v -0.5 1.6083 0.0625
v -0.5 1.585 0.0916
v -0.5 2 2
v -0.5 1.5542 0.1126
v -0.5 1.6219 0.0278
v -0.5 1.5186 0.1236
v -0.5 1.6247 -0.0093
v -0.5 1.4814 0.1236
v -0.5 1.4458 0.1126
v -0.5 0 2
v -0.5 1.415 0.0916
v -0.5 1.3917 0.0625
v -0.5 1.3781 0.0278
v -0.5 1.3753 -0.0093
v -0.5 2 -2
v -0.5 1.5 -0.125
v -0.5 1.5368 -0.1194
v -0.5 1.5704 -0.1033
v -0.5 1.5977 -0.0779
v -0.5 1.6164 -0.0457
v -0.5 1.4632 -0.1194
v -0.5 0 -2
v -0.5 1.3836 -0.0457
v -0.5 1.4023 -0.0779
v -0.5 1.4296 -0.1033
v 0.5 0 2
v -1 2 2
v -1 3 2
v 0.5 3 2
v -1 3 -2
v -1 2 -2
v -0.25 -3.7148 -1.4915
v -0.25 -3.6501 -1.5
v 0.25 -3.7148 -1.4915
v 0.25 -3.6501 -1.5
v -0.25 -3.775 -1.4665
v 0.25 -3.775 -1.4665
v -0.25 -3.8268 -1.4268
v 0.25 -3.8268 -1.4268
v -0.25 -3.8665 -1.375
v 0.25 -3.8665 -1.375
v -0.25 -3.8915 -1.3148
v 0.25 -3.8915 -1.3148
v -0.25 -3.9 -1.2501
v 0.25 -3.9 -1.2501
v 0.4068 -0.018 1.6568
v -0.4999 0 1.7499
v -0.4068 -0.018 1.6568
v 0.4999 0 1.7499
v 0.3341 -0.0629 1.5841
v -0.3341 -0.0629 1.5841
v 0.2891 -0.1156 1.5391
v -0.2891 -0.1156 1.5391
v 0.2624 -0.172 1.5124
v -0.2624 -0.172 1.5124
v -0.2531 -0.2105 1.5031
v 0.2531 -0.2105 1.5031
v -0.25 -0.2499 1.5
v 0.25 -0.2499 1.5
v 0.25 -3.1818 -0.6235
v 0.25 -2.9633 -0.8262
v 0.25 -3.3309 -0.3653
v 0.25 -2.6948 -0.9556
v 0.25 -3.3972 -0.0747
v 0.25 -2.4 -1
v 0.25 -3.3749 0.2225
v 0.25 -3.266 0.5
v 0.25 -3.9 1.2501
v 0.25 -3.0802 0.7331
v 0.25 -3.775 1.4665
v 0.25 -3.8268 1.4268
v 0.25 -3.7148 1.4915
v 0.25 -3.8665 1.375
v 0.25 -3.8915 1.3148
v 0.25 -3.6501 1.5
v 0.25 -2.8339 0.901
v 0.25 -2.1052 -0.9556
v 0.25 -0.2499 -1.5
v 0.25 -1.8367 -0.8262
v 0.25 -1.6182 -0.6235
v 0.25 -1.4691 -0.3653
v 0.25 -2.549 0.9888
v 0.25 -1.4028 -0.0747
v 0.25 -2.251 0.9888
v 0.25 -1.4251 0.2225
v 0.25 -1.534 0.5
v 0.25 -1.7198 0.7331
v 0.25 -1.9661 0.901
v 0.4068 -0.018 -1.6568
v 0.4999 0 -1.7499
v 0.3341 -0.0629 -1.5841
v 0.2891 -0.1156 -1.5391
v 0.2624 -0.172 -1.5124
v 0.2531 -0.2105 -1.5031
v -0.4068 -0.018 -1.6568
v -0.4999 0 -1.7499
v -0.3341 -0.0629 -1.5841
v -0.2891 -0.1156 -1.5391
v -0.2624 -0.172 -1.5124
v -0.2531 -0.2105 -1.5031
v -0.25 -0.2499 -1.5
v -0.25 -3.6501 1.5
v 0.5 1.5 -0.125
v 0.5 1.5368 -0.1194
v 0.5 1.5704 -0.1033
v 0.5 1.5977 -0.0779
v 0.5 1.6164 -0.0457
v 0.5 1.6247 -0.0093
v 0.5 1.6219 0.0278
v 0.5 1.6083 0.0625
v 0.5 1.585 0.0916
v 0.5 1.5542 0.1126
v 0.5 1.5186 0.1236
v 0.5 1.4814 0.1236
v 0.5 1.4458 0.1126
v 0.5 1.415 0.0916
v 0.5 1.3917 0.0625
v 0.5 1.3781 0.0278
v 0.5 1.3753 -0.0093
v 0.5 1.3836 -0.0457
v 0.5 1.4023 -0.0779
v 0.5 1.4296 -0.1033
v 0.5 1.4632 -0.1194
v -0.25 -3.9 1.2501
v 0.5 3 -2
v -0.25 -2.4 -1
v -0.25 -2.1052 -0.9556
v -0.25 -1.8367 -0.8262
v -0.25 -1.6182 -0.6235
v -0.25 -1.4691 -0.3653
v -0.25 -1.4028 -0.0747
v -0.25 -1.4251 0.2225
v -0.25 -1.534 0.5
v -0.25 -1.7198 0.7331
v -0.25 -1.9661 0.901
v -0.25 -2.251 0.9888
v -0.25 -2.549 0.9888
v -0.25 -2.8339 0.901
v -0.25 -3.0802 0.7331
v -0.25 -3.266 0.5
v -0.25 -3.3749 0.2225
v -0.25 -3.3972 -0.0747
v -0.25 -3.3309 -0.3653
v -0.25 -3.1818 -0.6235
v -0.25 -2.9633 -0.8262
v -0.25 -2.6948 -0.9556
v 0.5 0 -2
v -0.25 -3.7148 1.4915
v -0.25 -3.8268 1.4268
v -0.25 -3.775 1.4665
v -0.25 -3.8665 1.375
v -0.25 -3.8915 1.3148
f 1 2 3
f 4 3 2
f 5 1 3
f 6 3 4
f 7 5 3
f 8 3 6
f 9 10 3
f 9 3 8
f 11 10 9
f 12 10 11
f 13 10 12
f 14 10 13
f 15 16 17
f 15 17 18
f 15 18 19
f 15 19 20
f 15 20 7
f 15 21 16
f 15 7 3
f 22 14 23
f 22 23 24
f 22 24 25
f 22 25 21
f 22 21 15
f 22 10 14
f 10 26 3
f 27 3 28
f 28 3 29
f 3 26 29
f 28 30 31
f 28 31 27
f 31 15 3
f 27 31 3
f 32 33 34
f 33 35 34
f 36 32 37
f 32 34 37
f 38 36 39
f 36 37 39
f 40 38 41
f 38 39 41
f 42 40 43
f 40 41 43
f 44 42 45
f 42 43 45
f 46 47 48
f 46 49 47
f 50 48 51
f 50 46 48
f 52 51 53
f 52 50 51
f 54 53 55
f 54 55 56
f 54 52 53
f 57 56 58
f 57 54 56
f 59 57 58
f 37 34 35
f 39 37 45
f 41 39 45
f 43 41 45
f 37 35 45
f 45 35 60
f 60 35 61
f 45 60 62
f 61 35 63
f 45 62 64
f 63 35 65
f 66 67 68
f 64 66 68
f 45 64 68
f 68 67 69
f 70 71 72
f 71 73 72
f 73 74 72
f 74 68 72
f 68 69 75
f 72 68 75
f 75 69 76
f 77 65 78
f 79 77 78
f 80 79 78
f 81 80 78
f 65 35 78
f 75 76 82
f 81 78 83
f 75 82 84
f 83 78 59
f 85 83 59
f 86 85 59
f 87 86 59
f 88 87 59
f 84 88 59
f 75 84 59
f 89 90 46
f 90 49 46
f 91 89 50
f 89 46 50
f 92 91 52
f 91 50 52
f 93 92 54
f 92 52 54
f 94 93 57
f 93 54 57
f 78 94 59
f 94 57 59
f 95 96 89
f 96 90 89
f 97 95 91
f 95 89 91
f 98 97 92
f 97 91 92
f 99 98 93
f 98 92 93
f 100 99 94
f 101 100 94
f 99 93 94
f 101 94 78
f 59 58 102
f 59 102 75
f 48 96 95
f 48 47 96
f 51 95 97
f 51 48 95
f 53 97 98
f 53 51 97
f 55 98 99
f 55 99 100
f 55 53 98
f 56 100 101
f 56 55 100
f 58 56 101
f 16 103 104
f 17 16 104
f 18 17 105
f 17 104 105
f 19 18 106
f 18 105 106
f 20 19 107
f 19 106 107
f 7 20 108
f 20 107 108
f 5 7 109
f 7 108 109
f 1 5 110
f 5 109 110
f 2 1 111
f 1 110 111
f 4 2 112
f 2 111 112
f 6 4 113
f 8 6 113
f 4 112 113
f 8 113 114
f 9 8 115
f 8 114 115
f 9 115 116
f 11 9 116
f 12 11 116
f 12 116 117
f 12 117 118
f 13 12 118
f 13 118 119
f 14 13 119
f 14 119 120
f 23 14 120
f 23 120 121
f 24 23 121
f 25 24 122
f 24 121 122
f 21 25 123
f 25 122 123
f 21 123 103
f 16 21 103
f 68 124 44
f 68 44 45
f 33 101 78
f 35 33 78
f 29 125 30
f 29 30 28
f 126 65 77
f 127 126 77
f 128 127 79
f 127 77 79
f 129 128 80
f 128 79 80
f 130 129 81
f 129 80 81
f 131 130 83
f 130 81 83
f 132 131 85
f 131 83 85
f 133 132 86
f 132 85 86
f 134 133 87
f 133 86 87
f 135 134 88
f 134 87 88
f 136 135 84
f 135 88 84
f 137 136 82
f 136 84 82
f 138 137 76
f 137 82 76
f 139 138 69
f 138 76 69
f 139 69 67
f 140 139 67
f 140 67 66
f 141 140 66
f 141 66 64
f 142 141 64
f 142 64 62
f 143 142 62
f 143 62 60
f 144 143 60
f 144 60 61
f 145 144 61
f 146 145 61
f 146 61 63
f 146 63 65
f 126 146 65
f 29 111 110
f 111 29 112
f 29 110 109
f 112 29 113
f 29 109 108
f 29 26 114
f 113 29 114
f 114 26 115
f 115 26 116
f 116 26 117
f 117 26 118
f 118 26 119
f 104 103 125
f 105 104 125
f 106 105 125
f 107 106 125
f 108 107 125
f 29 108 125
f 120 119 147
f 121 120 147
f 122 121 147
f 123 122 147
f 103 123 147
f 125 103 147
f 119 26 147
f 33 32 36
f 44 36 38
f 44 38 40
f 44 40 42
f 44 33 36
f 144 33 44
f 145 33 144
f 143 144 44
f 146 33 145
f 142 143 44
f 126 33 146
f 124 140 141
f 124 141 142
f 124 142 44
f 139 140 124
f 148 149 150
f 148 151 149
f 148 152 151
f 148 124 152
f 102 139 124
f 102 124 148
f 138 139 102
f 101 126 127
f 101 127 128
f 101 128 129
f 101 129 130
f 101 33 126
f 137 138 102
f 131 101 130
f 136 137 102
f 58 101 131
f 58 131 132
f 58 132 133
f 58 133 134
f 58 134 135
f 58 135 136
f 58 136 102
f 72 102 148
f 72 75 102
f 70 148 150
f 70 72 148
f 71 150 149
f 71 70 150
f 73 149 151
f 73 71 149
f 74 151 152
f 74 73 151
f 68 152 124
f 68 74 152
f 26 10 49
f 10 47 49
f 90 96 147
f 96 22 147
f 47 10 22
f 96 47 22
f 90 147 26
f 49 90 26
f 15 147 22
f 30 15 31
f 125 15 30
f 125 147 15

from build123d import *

# Parameters (mm, degrees)
SZKIC1_W                    = 1
SZKIC1_H                    = 4
DODANIE_WYCI_GNI_CIE1_DEPTH = 3
SZKIC4_W                    = 0.5
SZKIC4_H                    = 3
DODANIE_WYCI_GNI_CIE3_DEPTH = 3.9
SZKIC5_R                    = 1
WYTNIJ_WYCI_GNI_CIE2_DEPTH  = 3.9
ZAOKR_GLENIE1_R             = 0.25
SZKIC8_W                    = 4
SZKIC8_H                    = 1
DODANIE_WYCI_GNI_CIE4_DEPTH = 0.5
SZKIC9_R                    = 0.125
WYTNIJ_WYCI_GNI_CIE3_DEPTH  = 1


with BuildPart() as part:
    # Szkic1 → Dodanie-wyciągnięcie1 (new body)
    with BuildSketch(Plane(origin=(0, 0, 0), x_dir=(1, 0, 0), z_dir=(0, 1, 0))):
        Rectangle(SZKIC1_W, SZKIC1_H)
    extrude(amount=DODANIE_WYCI_GNI_CIE1_DEPTH)

    # Szkic4 → Dodanie-wyciągnięcie3 (add)
    with BuildSketch(Plane.XZ):
        Rectangle(SZKIC4_W, SZKIC4_H)
    extrude(amount=DODANIE_WYCI_GNI_CIE3_DEPTH)

    # Szkic5 → Wytnij-wyciągnięcie2 (cut)
    with BuildSketch(Plane(origin=(0.25, 0, 0), x_dir=(0, 0, -1), z_dir=(1, 0, 0))):
        with Locations((0, -2.4)):
            Circle(SZKIC5_R)
    extrude(amount=-WYTNIJ_WYCI_GNI_CIE2_DEPTH, mode=Mode.SUBTRACT)

    # Zaokrąglenie1
    zaokr_glenie1_edges = [part.edges().sort_by_distance(p)[0] for p in [
        (0.25, 0, 0),
        (0, 0, 1.5),
        (-0.25, 0, 0),
        (0, 0, -1.5),
        (0, -3.9, 1.5),
        (0, -3.9, -1.5),
    ]]
    fillet(zaokr_glenie1_edges, radius=ZAOKR_GLENIE1_R - 0.0001)  # a hair under: the kernel refuses the full size

    # Szkic8 → Dodanie-wyciągnięcie4 (add)
    with BuildSketch(Plane.ZY.offset(0.5)):
        with Locations((0, 2.5)):
            Rectangle(SZKIC8_W, SZKIC8_H)
    extrude(amount=DODANIE_WYCI_GNI_CIE4_DEPTH)

    # Szkic9 → Wytnij-wyciągnięcie3 (cut)
    with BuildSketch(Plane(origin=(0.5, 0, 0), x_dir=(0, 0, -1), z_dir=(1, 0, 0))):
        with Locations((0, 1.5)):
            Circle(SZKIC9_R)
    extrude(amount=-WYTNIJ_WYCI_GNI_CIE3_DEPTH, mode=Mode.SUBTRACT)


solid = part.part
